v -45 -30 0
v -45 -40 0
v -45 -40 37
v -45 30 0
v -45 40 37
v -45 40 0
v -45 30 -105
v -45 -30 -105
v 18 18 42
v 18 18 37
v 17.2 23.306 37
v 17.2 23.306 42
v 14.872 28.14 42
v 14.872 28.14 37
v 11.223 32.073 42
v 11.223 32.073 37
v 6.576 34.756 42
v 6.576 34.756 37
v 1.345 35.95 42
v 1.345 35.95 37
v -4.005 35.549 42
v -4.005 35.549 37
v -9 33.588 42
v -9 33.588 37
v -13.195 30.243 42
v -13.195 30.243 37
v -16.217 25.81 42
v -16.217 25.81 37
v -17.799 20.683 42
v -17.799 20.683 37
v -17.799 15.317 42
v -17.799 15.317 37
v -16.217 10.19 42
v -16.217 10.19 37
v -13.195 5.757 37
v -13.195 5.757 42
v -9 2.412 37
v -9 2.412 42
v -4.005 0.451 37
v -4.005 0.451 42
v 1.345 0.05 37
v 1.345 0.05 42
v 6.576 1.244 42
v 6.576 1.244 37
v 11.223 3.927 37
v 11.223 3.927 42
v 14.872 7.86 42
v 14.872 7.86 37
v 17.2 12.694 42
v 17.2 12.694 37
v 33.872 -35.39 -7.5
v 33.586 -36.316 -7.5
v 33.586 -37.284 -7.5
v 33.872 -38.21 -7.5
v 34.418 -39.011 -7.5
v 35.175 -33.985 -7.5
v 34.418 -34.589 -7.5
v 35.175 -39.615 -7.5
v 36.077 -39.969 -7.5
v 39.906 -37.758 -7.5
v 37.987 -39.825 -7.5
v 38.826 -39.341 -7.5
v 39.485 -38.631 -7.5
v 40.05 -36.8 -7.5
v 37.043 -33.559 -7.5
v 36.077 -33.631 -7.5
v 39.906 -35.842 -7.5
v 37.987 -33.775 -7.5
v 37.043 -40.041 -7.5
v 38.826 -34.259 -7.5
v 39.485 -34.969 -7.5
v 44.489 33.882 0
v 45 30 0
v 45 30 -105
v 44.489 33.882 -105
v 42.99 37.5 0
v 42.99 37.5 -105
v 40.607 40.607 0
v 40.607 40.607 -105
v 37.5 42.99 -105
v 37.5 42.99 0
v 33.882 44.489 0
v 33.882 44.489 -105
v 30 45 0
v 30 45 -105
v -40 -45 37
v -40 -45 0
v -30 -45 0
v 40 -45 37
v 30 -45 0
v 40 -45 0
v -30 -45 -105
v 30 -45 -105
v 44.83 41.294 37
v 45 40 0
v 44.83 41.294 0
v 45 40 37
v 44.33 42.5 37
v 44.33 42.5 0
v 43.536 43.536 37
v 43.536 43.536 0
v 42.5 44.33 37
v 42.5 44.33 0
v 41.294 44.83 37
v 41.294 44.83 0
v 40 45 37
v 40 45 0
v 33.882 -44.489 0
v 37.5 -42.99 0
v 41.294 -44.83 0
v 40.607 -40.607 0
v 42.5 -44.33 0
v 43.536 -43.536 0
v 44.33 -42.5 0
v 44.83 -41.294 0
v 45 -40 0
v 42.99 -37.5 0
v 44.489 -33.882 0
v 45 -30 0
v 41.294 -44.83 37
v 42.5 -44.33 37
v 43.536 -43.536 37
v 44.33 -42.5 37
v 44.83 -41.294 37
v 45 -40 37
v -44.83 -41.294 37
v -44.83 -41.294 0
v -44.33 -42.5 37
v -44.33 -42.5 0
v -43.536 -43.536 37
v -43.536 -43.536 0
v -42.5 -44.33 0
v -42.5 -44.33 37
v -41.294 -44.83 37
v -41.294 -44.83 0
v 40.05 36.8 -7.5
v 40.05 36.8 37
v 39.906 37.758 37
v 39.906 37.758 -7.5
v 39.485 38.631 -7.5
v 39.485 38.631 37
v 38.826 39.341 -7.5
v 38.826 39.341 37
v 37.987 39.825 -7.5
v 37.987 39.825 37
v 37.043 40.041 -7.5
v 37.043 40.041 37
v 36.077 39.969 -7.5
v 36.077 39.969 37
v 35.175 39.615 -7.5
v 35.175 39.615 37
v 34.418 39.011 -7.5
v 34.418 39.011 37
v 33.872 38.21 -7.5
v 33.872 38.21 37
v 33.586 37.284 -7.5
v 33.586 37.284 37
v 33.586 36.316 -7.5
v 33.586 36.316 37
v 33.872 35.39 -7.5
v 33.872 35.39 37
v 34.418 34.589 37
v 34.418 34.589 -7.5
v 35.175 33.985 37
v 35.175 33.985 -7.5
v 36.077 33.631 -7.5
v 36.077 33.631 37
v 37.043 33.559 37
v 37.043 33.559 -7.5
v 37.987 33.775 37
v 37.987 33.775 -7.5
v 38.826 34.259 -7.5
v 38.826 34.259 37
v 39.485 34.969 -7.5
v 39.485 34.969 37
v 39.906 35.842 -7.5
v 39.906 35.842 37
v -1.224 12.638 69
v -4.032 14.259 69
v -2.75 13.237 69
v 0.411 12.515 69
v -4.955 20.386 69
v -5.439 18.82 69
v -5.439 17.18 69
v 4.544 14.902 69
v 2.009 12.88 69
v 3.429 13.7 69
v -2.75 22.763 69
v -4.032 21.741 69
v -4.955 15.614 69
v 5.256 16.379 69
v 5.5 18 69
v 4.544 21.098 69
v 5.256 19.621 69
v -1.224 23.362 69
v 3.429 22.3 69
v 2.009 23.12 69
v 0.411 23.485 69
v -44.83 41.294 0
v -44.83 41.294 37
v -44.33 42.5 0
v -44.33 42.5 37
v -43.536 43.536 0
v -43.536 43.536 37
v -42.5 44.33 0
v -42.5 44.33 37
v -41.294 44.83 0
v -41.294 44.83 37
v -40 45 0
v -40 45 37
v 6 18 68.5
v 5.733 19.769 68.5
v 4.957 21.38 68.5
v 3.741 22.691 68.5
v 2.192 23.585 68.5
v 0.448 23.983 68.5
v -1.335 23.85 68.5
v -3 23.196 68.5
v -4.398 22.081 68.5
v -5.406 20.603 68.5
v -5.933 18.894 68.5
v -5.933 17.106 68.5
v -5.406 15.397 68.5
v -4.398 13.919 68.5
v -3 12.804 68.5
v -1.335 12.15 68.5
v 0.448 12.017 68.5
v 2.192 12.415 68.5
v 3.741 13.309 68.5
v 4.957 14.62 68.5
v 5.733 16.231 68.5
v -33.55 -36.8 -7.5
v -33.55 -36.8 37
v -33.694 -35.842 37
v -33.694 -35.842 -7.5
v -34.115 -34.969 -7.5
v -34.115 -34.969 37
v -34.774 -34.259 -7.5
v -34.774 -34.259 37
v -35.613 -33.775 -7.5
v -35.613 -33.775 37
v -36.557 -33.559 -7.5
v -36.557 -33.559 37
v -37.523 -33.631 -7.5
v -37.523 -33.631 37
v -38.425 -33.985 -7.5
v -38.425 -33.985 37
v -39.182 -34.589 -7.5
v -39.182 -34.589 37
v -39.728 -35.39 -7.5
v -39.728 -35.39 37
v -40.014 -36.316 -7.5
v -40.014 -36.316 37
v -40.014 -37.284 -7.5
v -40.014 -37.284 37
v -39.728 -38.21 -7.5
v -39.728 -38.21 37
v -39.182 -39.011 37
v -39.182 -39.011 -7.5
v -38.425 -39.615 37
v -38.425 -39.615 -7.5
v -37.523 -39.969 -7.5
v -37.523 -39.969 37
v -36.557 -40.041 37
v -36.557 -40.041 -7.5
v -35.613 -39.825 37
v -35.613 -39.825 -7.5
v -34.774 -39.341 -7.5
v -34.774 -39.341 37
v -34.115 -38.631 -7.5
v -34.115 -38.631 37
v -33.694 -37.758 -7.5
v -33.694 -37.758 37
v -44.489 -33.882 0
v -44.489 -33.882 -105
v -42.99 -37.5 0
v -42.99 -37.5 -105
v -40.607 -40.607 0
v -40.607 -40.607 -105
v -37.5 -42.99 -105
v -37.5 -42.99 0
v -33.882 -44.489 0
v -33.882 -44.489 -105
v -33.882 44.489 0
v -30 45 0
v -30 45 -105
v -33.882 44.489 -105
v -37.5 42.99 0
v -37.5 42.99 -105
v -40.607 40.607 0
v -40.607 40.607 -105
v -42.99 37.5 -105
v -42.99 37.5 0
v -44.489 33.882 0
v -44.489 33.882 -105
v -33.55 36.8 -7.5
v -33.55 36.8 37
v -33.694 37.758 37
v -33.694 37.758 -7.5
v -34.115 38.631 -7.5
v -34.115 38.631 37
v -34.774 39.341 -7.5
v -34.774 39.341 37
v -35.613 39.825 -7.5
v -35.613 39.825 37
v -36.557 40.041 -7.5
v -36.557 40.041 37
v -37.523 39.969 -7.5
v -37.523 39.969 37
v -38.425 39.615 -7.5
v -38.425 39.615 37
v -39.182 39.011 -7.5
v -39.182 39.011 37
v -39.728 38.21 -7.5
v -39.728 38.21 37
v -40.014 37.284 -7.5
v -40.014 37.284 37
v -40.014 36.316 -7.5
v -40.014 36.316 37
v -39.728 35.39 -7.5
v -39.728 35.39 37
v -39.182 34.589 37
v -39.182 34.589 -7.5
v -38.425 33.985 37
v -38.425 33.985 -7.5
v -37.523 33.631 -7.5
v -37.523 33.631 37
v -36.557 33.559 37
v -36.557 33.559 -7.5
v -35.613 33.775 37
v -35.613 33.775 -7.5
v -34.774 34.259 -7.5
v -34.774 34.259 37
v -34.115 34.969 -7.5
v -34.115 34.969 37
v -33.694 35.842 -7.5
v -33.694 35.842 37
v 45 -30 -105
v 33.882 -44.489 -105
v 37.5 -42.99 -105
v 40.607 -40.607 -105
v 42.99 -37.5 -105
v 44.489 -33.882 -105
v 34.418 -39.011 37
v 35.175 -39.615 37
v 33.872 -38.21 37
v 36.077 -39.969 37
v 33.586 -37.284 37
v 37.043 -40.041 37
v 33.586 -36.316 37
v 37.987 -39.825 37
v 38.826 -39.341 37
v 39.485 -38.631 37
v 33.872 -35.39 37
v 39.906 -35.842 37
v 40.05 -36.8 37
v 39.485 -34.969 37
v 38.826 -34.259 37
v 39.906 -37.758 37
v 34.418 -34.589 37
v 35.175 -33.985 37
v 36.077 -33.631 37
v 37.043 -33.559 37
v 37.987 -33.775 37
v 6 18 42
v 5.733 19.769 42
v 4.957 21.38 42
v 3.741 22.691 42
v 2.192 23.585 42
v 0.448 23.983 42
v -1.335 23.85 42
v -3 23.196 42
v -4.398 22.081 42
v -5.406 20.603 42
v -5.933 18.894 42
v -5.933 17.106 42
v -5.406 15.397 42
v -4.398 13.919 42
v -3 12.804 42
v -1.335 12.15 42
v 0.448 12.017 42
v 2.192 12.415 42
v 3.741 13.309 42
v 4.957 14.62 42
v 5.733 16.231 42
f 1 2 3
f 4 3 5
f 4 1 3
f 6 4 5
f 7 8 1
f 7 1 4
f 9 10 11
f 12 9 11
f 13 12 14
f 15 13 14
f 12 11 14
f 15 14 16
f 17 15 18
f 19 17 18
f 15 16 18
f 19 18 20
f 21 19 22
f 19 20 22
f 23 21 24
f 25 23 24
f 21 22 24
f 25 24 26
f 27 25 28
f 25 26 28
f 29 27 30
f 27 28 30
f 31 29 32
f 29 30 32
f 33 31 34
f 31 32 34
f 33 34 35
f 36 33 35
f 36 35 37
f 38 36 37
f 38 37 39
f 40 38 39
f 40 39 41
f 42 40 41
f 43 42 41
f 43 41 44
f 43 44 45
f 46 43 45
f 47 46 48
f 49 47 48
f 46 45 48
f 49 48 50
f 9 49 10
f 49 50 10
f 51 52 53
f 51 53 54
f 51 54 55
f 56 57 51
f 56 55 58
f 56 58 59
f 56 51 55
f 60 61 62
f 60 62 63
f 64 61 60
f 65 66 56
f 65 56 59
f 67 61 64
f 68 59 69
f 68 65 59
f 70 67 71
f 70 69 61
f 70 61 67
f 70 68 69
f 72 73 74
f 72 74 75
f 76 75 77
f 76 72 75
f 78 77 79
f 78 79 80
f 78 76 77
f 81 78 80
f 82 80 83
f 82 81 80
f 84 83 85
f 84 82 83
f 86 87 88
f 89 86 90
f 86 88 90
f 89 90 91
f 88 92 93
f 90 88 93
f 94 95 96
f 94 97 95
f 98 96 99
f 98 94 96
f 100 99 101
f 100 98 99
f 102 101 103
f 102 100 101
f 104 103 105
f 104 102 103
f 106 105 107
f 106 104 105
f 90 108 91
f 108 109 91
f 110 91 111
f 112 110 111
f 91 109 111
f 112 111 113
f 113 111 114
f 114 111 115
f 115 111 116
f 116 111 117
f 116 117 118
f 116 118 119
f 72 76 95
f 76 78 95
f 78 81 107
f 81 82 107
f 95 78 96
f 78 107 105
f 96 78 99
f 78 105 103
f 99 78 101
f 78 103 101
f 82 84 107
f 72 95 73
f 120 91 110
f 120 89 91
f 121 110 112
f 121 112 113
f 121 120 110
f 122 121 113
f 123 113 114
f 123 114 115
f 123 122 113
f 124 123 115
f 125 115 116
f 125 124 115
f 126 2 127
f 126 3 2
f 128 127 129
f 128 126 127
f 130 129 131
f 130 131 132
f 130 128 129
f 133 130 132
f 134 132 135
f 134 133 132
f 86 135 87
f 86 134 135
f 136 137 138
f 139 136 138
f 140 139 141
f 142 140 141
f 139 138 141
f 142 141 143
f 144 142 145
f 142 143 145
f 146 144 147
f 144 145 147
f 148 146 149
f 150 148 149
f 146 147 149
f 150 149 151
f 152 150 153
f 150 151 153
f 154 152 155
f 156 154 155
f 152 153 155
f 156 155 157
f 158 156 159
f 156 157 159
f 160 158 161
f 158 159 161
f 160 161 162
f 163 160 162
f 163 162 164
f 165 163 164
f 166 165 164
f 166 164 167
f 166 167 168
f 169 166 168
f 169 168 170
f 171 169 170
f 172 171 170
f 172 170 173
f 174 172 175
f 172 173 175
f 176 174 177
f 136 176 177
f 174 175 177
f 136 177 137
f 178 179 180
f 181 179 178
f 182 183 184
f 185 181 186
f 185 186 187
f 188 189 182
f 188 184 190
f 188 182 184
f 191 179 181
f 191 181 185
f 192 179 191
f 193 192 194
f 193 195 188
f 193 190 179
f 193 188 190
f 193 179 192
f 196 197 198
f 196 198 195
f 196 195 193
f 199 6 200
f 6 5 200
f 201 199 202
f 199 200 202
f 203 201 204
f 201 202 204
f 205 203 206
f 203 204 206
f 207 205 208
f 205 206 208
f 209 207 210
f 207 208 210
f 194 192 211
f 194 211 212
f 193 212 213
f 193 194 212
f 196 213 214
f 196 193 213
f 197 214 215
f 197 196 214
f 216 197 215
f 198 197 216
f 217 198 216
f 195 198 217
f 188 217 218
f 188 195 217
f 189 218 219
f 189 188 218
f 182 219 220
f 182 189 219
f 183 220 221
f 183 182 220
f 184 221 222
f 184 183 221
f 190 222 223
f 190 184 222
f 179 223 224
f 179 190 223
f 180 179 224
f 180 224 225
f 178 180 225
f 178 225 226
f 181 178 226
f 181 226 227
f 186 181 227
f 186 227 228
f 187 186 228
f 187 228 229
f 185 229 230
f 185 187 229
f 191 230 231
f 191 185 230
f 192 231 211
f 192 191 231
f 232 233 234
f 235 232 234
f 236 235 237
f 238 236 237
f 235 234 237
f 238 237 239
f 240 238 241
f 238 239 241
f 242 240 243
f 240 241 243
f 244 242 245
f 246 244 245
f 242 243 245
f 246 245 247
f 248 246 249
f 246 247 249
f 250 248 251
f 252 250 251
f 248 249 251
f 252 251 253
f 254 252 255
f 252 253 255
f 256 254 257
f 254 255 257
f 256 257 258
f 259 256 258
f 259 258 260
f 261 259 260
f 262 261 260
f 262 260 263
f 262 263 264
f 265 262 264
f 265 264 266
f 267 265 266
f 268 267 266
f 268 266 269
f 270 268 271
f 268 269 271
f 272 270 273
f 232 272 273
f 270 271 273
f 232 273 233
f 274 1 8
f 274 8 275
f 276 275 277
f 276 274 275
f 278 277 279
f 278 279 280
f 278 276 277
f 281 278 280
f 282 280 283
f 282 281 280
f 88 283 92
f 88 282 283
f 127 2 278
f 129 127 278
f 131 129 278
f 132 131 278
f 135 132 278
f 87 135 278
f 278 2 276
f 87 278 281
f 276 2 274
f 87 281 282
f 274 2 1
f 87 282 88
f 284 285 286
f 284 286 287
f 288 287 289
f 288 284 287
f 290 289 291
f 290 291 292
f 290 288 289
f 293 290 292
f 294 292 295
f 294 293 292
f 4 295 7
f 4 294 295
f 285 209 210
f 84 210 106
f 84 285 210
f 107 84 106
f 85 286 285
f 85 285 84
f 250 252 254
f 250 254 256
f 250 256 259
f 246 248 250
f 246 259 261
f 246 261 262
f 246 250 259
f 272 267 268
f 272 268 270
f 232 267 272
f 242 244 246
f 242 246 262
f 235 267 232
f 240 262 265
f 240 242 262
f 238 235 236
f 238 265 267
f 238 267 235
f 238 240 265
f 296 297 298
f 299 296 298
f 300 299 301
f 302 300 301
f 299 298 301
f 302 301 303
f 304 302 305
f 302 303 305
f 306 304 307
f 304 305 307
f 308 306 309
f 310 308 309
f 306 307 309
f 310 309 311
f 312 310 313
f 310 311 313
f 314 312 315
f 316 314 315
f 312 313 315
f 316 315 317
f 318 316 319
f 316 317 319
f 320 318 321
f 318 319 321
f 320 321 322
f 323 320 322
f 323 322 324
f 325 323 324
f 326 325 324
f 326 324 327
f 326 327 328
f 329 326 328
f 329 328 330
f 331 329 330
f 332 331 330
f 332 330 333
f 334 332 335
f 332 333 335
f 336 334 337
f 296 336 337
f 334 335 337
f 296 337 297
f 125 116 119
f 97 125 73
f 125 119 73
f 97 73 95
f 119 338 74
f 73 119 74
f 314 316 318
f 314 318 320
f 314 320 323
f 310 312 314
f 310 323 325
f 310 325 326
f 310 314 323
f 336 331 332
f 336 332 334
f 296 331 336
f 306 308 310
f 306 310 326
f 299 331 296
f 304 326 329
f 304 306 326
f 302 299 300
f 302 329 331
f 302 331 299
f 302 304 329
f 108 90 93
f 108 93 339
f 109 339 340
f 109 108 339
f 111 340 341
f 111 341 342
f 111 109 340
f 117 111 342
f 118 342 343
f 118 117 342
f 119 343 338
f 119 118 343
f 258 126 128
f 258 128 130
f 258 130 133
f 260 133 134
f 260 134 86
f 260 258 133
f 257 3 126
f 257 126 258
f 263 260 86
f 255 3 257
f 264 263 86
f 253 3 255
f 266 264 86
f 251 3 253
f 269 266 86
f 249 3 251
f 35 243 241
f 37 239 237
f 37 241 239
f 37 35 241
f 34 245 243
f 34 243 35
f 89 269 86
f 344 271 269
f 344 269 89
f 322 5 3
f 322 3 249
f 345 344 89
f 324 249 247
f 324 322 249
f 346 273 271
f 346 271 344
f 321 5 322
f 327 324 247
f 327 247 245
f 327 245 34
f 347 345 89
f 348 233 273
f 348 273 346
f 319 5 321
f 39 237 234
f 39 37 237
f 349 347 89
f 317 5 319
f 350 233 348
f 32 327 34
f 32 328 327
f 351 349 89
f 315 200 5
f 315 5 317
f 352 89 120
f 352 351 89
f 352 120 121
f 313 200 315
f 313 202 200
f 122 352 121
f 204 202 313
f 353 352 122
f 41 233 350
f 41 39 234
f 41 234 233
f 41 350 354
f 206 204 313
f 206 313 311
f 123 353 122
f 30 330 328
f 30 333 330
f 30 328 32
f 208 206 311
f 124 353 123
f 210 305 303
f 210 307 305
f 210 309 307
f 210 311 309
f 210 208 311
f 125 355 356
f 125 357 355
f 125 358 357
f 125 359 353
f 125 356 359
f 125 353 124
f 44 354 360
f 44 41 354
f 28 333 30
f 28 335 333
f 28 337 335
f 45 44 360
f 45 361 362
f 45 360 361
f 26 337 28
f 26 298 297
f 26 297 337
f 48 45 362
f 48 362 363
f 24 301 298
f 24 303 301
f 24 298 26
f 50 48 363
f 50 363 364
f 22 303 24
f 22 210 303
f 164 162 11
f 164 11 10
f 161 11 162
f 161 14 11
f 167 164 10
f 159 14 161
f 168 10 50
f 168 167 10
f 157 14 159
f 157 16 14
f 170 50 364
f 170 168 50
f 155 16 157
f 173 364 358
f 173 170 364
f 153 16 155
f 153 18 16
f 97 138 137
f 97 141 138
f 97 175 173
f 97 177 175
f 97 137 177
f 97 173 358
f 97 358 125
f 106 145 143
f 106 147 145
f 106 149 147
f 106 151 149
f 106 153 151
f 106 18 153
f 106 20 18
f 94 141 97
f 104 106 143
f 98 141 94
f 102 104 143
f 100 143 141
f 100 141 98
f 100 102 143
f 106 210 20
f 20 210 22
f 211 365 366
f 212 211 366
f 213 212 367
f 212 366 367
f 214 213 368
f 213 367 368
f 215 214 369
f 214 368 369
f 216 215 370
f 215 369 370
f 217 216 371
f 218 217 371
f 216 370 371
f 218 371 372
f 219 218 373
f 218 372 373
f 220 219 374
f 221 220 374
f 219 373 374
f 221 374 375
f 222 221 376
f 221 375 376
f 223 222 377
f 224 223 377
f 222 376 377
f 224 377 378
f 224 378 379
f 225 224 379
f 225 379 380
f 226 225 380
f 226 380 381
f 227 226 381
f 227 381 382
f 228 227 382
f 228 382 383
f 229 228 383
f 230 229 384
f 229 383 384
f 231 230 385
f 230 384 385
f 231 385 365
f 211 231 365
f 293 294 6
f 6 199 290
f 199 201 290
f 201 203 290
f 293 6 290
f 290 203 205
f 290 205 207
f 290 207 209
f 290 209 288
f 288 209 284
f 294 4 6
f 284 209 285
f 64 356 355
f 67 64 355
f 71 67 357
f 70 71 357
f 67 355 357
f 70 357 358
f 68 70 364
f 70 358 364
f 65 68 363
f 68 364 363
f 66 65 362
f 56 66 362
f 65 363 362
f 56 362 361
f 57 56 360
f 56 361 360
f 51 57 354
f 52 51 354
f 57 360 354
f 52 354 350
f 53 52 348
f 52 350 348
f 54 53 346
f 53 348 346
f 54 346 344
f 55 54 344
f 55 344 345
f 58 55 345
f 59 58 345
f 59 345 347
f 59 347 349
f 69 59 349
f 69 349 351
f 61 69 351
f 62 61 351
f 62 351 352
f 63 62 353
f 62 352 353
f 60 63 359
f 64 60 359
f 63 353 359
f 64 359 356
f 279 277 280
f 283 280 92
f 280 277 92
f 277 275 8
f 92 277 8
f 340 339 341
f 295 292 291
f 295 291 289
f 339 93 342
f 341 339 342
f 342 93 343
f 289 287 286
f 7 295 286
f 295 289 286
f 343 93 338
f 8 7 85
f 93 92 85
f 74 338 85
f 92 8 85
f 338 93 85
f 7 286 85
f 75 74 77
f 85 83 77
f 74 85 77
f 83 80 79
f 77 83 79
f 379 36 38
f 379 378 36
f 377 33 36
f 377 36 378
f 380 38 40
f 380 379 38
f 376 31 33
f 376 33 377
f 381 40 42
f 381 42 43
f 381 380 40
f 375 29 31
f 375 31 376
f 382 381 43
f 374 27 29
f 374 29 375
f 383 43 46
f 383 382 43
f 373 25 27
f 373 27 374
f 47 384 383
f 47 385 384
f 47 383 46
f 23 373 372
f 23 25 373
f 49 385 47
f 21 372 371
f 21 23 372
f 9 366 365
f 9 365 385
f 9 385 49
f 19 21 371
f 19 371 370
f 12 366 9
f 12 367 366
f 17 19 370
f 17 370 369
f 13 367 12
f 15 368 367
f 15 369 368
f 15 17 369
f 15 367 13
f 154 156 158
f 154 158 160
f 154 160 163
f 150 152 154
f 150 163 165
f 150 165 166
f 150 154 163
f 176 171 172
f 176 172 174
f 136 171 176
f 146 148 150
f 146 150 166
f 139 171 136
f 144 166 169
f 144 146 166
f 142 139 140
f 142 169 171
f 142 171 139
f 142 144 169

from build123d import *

# Parameters (mm, degrees)
SKETCH1_W           = 90
SKETCH1_H           = 90
BOSS_EXTRUDE1_DEPTH = 37
FILLET1_R           = 5
SKETCH2_R           = 18
BOSS_EXTRUDE2_DEPTH = 5
SKETCH3_R           = 6
BOSS_EXTRUDE3_DEPTH = 27
BOSS_EXTRUDE5_DEPTH = 105
CHAMFER1_SIZE       = 0.5
SKETCH5_R           = 3.25
CUT_EXTRUDE1_DEPTH  = 44.5


with BuildPart() as part:
    # Sketch1 → Boss-Extrude1 (new body)
    with BuildSketch(Plane.XY):
        Rectangle(SKETCH1_W, SKETCH1_H)
    extrude(amount=BOSS_EXTRUDE1_DEPTH)

    # Fillet1
    fillet1_edges = [part.edges().sort_by_distance(p)[0] for p in [
        (45, -45, 18.5),
        (-45, -45, 18.5),
        (-45, 45, 18.5),
        (45, 45, 18.5),
    ]]
    fillet(fillet1_edges, radius=FILLET1_R)

    # Sketch2 → Boss-Extrude2 (add)
    with BuildSketch(Plane.XY.offset(37)):
        with Locations((0, 18)):
            Circle(SKETCH2_R)
    extrude(amount=BOSS_EXTRUDE2_DEPTH)

    # Sketch3 → Boss-Extrude3 (add)
    with BuildSketch(Plane.XY.offset(42)):
        with Locations((0, 18)):
            Circle(SKETCH3_R)
    extrude(amount=BOSS_EXTRUDE3_DEPTH)

    # Sketch4 → Boss-Extrude5 (add)
    with BuildSketch(Plane(origin=(0, 0, 0), x_dir=(-1, 0, 0), z_dir=(0, 0, -1))):
        with BuildLine():
            Line((-30, 45), (30, 45))
            ThreePointArc((30, 45), (40.606601718, 40.606601718), (45, 30))
            Line((45, 30), (45, -30))
            ThreePointArc((45, -30), (40.606601718, -40.606601718), (30, -45))
            Line((30, -45), (-30, -45))
            ThreePointArc((-30, -45), (-40.606601718, -40.606601718), (-45, -30))
            Line((-45, -30), (-45, 30))
            ThreePointArc((-45, 30), (-40.606601718, 40.606601718), (-30, 45))
        make_face()
    extrude(amount=BOSS_EXTRUDE5_DEPTH)

    # Chamfer1
    chamfer1_edges = [part.edges().sort_by_distance(p)[0] for p in [
        (-6, 18, 69),
    ]]
    chamfer(chamfer1_edges, length=CHAMFER1_SIZE)

    # Sketch5 → Cut-Extrude1 (cut)
    with BuildSketch(Plane.XY.offset(37)):
        with Locations((-36.8, 36.8)):
            Circle(SKETCH5_R)
        with Locations((36.8, 36.8)):
            Circle(SKETCH5_R)
        with Locations((36.8, -36.8)):
            Circle(SKETCH5_R)
        with Locations((-36.8, -36.8)):
            Circle(SKETCH5_R)
    extrude(amount=-CUT_EXTRUDE1_DEPTH, mode=Mode.SUBTRACT)


solid = part.part
